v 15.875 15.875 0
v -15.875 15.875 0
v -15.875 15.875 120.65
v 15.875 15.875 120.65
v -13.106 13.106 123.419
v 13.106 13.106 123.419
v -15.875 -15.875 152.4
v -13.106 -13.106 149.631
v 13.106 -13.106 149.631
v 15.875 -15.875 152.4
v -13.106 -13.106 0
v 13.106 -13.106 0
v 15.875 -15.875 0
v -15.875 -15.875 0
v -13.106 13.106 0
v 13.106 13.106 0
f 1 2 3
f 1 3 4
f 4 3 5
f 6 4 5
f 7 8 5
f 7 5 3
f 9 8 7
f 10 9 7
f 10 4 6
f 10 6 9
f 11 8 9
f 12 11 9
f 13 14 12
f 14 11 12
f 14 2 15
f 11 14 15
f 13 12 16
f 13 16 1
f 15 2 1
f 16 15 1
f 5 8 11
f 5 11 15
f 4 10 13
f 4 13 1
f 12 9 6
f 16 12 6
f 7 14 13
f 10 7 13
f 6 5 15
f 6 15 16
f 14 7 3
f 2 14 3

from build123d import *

# Parameters (mm, degrees)
SKETCH_W     = 31.75
SKETCH_H     = 31.75
SKETCH_W_2   = 26.2128
SKETCH_H_2   = 26.2128
PAD_DEPTH    = 152.4
POCKET_DEPTH = 31.75


with BuildPart() as part:
    # Sketch → Pad (new body)
    with BuildSketch(Plane.XY):
        Rectangle(SKETCH_W, SKETCH_H)
        Rectangle(SKETCH_W_2, SKETCH_H_2, mode=Mode.SUBTRACT)
    extrude(amount=PAD_DEPTH)

    # Sketch001 → Pocket (cut)
    with BuildSketch(Plane.YZ.offset(15.875)):
        Polygon((-15.875, 152.4), (15.875, 152.4), (15.875, 120.65), align=None)
    extrude(amount=-POCKET_DEPTH, mode=Mode.SUBTRACT)


solid = part.part
